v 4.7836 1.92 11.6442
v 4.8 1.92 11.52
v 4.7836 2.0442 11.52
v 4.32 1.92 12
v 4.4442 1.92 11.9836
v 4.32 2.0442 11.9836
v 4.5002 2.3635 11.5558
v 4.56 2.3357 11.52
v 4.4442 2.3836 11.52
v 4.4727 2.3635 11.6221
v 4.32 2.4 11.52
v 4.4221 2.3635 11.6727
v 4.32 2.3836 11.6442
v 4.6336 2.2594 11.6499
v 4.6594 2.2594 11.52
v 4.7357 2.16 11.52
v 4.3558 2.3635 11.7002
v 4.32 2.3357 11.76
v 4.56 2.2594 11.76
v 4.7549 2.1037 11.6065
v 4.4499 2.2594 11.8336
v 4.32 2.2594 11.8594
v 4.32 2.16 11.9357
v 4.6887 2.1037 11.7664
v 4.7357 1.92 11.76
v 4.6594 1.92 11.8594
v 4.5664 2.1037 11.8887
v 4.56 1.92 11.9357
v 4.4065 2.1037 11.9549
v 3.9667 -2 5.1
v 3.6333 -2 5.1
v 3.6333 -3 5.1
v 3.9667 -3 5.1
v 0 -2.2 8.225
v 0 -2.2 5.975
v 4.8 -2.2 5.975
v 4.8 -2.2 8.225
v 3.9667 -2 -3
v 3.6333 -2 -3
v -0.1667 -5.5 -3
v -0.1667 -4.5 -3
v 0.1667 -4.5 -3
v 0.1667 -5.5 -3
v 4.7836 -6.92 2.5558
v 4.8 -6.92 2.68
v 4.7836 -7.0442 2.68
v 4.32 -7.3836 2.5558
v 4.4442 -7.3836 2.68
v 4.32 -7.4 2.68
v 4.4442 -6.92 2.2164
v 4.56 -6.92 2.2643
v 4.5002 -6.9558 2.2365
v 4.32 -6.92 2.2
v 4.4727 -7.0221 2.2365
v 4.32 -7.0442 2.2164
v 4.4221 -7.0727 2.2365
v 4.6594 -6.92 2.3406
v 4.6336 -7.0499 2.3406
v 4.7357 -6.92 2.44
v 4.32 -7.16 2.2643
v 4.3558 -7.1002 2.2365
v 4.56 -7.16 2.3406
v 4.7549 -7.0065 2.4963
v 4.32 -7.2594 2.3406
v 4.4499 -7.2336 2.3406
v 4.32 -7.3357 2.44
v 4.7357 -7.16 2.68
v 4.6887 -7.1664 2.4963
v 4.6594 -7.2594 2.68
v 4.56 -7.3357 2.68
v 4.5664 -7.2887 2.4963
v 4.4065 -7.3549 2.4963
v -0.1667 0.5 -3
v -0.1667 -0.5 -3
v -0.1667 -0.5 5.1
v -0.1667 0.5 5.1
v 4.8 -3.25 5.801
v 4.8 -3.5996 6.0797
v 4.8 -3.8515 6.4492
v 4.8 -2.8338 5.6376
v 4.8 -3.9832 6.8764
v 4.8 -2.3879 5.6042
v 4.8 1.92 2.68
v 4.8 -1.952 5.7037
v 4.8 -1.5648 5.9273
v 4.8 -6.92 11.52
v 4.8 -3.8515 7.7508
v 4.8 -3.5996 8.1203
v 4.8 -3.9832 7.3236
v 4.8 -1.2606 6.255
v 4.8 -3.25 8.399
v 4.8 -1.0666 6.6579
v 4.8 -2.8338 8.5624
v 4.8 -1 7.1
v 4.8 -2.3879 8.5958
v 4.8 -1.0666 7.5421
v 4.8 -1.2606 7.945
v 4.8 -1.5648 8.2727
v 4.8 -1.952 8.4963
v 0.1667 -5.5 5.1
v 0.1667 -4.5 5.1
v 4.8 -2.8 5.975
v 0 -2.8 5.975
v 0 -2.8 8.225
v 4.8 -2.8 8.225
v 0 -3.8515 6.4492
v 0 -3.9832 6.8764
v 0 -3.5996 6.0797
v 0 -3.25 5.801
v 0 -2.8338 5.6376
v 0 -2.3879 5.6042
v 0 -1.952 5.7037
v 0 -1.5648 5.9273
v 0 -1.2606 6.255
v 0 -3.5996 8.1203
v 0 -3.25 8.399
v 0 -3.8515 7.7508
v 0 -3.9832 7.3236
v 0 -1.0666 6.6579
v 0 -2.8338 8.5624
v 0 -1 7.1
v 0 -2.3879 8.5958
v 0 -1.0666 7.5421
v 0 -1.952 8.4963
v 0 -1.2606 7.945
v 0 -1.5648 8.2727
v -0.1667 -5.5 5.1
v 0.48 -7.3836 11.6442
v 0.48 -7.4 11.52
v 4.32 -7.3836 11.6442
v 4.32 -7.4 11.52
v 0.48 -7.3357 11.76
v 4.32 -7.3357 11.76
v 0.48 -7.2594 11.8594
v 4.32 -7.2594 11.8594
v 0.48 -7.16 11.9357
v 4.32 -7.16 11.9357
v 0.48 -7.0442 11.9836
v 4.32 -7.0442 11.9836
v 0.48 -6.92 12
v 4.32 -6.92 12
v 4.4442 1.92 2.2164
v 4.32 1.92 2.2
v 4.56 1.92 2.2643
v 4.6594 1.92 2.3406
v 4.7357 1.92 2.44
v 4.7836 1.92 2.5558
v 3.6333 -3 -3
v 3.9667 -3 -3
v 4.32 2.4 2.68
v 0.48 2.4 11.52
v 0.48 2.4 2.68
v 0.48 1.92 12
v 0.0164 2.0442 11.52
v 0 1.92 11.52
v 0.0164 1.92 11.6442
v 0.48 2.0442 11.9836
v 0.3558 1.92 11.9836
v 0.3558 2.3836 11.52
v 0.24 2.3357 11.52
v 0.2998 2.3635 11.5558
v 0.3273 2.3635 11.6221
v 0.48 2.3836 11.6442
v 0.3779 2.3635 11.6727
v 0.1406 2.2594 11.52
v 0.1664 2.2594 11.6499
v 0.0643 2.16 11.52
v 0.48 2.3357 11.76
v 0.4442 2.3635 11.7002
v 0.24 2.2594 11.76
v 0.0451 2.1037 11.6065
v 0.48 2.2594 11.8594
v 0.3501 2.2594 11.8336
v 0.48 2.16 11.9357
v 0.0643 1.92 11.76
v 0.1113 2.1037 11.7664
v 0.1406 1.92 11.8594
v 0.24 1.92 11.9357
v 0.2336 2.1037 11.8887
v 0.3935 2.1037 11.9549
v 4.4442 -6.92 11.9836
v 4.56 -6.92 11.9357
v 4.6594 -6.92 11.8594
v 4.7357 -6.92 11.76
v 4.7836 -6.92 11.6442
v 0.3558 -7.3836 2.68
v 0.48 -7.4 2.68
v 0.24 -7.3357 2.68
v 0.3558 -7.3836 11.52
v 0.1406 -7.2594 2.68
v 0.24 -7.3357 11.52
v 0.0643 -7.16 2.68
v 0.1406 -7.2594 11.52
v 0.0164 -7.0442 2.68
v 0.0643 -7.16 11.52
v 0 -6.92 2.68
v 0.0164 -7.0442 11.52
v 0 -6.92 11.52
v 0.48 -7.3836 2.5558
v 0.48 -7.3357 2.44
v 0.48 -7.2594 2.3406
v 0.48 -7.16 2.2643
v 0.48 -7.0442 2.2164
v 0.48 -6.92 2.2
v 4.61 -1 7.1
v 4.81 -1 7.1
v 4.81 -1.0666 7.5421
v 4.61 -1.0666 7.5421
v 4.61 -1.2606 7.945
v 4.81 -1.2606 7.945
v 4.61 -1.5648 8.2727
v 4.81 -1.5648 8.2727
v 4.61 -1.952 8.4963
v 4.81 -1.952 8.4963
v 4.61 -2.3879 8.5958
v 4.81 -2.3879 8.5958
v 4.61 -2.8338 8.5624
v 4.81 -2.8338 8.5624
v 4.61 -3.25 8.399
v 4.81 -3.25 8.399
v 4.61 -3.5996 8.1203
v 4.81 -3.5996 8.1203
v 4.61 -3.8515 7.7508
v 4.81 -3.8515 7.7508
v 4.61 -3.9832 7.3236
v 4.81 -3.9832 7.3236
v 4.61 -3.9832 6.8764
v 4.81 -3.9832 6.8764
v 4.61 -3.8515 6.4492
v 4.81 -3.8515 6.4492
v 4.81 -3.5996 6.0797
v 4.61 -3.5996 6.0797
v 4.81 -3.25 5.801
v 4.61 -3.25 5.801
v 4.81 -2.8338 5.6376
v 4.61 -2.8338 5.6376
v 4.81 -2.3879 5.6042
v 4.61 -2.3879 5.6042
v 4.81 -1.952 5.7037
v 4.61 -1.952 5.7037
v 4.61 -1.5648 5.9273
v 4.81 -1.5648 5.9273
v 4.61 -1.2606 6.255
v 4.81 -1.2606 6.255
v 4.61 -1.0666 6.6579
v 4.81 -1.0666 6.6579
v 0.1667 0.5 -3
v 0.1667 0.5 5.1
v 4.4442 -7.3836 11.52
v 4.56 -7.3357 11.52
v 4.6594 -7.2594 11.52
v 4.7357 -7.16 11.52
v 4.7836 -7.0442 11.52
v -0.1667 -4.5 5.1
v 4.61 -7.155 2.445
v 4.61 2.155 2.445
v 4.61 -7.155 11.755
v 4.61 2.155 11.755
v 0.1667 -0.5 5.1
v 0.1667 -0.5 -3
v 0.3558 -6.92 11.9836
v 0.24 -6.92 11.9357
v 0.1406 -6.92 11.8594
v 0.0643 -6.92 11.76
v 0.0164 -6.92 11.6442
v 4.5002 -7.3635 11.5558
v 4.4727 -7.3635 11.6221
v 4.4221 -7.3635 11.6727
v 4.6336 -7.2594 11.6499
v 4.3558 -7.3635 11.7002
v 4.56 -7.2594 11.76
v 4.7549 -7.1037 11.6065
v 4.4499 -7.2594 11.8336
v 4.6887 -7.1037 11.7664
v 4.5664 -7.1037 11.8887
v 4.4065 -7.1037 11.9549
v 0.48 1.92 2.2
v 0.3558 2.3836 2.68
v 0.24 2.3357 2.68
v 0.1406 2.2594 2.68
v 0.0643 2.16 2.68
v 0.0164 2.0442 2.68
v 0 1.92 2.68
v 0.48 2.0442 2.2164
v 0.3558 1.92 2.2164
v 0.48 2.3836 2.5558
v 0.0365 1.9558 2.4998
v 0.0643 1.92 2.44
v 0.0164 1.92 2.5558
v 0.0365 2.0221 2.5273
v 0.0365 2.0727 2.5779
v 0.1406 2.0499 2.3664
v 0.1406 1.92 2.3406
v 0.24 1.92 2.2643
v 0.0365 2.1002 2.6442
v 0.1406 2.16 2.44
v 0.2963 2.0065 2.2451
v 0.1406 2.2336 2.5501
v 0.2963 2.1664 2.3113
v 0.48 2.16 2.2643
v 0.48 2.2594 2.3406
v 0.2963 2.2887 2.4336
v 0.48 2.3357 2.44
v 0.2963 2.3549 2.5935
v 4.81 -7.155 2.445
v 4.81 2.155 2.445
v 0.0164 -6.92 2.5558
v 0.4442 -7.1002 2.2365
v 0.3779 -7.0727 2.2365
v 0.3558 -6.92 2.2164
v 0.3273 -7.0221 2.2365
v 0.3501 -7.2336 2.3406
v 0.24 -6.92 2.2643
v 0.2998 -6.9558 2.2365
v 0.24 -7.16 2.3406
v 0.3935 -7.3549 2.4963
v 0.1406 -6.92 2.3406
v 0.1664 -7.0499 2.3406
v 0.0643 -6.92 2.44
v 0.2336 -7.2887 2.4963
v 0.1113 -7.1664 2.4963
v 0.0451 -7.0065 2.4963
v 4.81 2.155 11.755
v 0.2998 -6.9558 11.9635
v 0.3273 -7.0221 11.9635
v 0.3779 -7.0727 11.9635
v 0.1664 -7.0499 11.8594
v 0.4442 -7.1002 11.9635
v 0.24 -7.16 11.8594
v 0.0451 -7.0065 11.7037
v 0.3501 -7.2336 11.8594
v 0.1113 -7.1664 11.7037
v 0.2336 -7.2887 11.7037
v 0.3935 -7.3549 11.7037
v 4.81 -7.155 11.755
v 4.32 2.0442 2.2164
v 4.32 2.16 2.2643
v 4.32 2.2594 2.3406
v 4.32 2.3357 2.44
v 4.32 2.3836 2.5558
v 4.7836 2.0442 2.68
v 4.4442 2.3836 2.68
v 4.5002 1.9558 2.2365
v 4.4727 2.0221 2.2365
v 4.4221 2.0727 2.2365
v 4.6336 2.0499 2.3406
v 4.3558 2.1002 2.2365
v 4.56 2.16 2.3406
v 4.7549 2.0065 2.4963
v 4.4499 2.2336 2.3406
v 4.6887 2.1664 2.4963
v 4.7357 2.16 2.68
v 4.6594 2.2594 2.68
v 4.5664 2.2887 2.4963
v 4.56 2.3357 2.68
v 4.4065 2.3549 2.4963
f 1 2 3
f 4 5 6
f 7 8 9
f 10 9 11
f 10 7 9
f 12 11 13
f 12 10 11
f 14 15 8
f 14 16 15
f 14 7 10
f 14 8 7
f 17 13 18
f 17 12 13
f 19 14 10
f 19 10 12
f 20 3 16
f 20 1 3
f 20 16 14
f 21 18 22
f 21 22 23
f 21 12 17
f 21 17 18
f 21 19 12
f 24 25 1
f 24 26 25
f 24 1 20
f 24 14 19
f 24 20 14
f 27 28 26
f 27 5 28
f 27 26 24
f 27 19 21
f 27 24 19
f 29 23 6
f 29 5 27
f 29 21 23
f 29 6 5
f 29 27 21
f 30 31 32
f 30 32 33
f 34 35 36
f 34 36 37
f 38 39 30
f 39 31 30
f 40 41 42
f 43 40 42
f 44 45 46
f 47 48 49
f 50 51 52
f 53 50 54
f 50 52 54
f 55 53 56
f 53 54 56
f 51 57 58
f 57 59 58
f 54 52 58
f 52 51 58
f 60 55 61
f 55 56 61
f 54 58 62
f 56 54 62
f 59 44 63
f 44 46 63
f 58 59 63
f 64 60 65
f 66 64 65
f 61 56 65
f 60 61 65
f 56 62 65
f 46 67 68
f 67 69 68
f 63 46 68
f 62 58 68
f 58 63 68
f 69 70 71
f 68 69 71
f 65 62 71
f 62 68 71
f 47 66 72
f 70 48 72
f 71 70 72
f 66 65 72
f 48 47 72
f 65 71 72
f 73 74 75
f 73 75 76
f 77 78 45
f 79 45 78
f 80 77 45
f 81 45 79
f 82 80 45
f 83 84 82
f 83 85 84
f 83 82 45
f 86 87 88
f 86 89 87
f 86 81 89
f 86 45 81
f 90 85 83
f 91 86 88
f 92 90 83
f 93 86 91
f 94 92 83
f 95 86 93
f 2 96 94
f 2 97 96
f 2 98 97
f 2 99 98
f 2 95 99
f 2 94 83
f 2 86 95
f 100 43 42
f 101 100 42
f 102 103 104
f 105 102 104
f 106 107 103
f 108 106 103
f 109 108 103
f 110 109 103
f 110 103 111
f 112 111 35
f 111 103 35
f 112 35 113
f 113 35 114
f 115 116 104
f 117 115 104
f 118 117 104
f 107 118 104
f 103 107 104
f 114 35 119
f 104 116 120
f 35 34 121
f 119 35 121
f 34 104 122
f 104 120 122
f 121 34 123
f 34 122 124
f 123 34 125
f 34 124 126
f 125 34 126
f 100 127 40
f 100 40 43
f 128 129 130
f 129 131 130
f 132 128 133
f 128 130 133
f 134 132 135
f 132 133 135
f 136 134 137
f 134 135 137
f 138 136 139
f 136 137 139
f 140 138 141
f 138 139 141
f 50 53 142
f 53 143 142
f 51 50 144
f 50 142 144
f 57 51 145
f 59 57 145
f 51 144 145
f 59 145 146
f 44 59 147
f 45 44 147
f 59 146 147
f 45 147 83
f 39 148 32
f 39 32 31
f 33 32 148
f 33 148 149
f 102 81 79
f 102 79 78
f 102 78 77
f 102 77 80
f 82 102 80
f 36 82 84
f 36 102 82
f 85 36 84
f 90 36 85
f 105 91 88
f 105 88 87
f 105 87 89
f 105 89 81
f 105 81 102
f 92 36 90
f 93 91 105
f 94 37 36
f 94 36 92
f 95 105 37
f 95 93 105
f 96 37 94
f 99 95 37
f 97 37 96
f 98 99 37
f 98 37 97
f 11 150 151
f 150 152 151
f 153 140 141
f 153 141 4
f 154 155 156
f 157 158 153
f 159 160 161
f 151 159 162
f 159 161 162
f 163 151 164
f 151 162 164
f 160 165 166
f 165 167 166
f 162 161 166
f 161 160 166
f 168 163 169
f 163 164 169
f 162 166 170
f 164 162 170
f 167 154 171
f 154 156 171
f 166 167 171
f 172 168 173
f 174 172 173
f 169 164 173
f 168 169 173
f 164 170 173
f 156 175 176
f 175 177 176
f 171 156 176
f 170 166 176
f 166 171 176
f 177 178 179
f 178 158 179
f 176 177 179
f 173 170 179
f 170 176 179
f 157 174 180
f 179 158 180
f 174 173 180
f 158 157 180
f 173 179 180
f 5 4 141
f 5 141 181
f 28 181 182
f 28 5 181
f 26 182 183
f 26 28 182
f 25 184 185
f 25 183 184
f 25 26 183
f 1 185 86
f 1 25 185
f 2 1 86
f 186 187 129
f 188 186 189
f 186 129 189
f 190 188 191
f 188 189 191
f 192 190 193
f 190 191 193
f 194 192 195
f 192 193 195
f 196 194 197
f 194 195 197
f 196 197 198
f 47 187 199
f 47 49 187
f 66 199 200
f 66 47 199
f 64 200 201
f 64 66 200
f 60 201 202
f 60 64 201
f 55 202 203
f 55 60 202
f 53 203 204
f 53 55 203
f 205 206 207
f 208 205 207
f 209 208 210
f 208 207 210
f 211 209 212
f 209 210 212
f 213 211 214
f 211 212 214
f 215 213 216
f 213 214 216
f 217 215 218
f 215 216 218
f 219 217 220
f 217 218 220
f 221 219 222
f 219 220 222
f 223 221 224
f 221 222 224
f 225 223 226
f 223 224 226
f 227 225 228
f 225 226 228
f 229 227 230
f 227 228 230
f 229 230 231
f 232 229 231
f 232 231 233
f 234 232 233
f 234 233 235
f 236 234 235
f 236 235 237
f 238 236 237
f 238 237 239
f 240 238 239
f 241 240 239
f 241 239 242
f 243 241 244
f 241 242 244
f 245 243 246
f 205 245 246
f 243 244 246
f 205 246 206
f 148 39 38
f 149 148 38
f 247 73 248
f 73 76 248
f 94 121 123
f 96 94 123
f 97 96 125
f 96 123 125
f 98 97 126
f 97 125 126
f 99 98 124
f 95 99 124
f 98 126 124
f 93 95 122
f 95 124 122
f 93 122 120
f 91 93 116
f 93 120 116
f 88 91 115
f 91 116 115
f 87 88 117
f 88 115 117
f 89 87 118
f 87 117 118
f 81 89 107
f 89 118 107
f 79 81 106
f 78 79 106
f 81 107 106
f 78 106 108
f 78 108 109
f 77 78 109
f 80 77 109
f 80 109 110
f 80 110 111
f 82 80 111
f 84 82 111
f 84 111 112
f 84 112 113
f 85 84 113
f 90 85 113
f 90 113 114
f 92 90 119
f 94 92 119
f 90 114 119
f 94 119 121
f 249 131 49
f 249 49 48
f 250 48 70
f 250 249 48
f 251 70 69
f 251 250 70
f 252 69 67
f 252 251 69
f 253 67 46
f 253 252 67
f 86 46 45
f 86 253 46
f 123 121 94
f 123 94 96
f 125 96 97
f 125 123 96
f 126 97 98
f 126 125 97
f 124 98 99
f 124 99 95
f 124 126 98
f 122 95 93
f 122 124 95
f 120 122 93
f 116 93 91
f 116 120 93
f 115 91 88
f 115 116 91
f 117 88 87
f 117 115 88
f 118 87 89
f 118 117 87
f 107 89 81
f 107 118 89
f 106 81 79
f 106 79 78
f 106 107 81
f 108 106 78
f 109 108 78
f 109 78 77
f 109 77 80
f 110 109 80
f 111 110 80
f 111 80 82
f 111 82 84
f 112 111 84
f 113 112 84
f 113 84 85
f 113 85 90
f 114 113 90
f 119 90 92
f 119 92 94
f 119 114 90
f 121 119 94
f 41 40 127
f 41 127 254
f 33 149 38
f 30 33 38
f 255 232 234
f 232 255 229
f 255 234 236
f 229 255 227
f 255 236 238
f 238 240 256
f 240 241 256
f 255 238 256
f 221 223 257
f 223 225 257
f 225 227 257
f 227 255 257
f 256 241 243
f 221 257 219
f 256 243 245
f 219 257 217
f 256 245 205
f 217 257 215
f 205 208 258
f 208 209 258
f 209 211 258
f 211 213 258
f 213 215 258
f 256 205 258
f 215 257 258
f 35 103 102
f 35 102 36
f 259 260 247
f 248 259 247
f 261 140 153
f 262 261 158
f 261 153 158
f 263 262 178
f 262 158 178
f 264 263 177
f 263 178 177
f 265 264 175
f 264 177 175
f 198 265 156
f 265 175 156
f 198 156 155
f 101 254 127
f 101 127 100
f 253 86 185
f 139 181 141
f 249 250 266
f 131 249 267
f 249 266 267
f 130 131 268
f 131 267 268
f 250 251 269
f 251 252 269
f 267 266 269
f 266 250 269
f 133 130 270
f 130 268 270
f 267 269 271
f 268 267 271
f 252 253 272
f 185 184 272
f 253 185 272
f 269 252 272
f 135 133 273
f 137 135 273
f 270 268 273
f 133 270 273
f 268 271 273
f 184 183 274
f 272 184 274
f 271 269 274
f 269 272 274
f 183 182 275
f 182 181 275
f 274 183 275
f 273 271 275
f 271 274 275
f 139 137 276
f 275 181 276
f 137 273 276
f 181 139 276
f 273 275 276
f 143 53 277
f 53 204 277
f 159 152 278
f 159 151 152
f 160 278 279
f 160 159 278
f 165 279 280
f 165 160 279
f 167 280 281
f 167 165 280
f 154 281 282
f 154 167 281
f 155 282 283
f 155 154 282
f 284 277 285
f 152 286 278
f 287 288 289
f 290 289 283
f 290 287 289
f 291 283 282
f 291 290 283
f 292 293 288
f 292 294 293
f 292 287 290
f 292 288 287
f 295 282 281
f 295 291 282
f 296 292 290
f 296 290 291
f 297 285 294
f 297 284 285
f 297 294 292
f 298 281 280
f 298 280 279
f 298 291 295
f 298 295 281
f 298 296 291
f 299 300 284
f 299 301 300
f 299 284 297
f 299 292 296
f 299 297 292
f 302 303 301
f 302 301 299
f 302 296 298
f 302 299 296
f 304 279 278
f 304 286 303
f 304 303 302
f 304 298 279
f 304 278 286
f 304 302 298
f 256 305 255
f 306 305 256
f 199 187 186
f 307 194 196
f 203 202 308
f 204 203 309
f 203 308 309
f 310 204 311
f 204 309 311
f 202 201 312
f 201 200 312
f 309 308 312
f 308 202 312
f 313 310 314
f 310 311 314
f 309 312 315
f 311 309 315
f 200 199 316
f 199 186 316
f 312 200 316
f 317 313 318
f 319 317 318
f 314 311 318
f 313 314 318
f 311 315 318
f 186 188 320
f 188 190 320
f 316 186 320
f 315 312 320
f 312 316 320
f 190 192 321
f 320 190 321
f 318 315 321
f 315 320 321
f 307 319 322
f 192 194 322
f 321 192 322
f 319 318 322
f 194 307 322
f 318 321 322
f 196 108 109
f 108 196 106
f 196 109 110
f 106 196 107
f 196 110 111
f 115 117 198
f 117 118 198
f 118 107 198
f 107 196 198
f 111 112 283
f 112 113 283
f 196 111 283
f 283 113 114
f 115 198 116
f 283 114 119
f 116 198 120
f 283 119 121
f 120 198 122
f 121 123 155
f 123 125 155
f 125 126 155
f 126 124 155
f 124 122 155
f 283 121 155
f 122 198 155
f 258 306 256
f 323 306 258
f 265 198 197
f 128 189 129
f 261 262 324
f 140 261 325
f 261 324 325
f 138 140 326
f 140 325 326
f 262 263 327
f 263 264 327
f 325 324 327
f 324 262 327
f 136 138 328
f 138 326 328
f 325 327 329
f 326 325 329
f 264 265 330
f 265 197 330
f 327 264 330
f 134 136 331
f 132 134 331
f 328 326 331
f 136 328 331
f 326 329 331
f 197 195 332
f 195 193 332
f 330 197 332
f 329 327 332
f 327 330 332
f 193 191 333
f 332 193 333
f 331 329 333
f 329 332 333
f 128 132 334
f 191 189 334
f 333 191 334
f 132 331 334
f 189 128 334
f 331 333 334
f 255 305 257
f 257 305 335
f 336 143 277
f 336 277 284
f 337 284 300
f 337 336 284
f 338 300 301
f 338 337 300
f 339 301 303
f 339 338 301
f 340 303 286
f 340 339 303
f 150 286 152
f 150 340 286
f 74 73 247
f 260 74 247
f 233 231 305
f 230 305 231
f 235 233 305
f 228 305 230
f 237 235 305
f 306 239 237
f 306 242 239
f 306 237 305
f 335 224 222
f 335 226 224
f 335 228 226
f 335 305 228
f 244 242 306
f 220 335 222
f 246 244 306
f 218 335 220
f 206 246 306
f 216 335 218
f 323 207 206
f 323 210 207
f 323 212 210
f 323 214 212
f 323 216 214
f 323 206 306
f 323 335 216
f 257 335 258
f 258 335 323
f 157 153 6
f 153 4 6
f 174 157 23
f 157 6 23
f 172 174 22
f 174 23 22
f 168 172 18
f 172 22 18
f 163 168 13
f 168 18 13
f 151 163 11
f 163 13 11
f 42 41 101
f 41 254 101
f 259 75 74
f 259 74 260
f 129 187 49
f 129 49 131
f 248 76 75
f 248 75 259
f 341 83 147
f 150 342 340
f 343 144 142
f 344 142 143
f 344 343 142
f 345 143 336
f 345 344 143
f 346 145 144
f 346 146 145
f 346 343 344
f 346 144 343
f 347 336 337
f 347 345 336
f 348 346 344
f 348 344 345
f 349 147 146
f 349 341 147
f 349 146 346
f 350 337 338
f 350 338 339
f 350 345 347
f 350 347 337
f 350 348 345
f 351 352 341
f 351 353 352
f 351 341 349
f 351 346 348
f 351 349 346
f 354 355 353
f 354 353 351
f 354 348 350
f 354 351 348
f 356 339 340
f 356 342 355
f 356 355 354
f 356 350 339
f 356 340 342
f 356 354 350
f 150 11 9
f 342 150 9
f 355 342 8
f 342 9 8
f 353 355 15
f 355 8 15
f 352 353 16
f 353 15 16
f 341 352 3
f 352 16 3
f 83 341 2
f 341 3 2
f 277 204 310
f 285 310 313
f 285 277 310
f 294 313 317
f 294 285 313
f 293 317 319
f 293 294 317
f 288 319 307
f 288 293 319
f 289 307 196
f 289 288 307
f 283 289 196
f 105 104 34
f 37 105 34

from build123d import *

# Parameters (mm, degrees)
SKETCH001_R       = 1.5
SKETCH001_W       = 0.6
SKETCH001_H       = 2.25
PAD001_DEPTH      = 4.8
SKETCH003_W       = 0.333334
SKETCH003_H       = 1
PAD002_DEPTH      = 5.1
PAD002_DEPTH_BACK = 3
SKETCH004_W       = 9.31
SKETCH004_H       = 9.31
SKETCH004_R       = 1.5
PAD003_DEPTH      = 0.2
SKETCH_W          = 9.8
SKETCH_H          = 9.8
SKETCH_R          = 1.5
PAD_DEPTH         = 4.8
FILLET_R          = 0.48


with BuildPart() as pad001:
    # Sketch001 → Pad001 (new body)
    with BuildSketch(Plane.YZ):
        with Locations((-2.5, 7.1)):
            Circle(SKETCH001_R)
        with Locations((-2.5, 7.1)):
            Rectangle(SKETCH001_W, SKETCH001_H, mode=Mode.SUBTRACT)
    extrude(amount=PAD001_DEPTH)


with BuildPart() as pad002:
    # Sketch003 → Pad002 (new body, two sides)
    with BuildSketch(Plane.XY) as pad002_sk:
        Rectangle(SKETCH003_W, SKETCH003_H)
        with Locations((3.8, -2.5)):
            Rectangle(SKETCH003_W, SKETCH003_H)
        with Locations((0, -5)):
            Rectangle(SKETCH003_W, SKETCH003_H)
    extrude(amount=PAD002_DEPTH)
    extrude(pad002_sk.sketch, amount=-PAD002_DEPTH_BACK)


with BuildPart() as pad003:
    # Sketch004 → Pad003 (new body)
    with BuildSketch(Plane.YZ.offset(4.81)):
        with Locations((-2.5, 7.1)):
            Rectangle(SKETCH004_W, SKETCH004_H)
        with Locations((-2.5, 7.1)):
            Circle(SKETCH004_R, mode=Mode.SUBTRACT)
    extrude(amount=-PAD003_DEPTH)


with BuildPart() as fillet_body:
    # Sketch → Pad (new body)
    with BuildSketch(Plane.YZ):
        with Locations((-2.5, 7.1)):
            Rectangle(SKETCH_W, SKETCH_H)
        with Locations((-2.5, 7.1)):
            Circle(SKETCH_R, mode=Mode.SUBTRACT)
    extrude(amount=PAD_DEPTH)

    # Fillet
    fillet_edges = [fillet_body.edges().sort_by_distance(p)[0] for p in [
        (0, -7.4, 7.1),
        (0, -2.5, 12),
        (4.8, -2.5, 12),
        (4.8, -7.4, 7.1),
        (4.8, 2.4, 7.1),
        (4.8, -2.5, 2.2),
        (2.4, -7.4, 12),
        (2.4, -7.4, 2.2),
        (2.4, 2.4, 2.2),
        (0, -2.5, 2.2),
        (0, 2.4, 7.1),
        (2.4, 2.4, 12),
    ]]
    fillet(fillet_edges, radius=FILLET_R)


solid = Compound([pad001.part, pad002.part, pad003.part, fillet_body.part])
